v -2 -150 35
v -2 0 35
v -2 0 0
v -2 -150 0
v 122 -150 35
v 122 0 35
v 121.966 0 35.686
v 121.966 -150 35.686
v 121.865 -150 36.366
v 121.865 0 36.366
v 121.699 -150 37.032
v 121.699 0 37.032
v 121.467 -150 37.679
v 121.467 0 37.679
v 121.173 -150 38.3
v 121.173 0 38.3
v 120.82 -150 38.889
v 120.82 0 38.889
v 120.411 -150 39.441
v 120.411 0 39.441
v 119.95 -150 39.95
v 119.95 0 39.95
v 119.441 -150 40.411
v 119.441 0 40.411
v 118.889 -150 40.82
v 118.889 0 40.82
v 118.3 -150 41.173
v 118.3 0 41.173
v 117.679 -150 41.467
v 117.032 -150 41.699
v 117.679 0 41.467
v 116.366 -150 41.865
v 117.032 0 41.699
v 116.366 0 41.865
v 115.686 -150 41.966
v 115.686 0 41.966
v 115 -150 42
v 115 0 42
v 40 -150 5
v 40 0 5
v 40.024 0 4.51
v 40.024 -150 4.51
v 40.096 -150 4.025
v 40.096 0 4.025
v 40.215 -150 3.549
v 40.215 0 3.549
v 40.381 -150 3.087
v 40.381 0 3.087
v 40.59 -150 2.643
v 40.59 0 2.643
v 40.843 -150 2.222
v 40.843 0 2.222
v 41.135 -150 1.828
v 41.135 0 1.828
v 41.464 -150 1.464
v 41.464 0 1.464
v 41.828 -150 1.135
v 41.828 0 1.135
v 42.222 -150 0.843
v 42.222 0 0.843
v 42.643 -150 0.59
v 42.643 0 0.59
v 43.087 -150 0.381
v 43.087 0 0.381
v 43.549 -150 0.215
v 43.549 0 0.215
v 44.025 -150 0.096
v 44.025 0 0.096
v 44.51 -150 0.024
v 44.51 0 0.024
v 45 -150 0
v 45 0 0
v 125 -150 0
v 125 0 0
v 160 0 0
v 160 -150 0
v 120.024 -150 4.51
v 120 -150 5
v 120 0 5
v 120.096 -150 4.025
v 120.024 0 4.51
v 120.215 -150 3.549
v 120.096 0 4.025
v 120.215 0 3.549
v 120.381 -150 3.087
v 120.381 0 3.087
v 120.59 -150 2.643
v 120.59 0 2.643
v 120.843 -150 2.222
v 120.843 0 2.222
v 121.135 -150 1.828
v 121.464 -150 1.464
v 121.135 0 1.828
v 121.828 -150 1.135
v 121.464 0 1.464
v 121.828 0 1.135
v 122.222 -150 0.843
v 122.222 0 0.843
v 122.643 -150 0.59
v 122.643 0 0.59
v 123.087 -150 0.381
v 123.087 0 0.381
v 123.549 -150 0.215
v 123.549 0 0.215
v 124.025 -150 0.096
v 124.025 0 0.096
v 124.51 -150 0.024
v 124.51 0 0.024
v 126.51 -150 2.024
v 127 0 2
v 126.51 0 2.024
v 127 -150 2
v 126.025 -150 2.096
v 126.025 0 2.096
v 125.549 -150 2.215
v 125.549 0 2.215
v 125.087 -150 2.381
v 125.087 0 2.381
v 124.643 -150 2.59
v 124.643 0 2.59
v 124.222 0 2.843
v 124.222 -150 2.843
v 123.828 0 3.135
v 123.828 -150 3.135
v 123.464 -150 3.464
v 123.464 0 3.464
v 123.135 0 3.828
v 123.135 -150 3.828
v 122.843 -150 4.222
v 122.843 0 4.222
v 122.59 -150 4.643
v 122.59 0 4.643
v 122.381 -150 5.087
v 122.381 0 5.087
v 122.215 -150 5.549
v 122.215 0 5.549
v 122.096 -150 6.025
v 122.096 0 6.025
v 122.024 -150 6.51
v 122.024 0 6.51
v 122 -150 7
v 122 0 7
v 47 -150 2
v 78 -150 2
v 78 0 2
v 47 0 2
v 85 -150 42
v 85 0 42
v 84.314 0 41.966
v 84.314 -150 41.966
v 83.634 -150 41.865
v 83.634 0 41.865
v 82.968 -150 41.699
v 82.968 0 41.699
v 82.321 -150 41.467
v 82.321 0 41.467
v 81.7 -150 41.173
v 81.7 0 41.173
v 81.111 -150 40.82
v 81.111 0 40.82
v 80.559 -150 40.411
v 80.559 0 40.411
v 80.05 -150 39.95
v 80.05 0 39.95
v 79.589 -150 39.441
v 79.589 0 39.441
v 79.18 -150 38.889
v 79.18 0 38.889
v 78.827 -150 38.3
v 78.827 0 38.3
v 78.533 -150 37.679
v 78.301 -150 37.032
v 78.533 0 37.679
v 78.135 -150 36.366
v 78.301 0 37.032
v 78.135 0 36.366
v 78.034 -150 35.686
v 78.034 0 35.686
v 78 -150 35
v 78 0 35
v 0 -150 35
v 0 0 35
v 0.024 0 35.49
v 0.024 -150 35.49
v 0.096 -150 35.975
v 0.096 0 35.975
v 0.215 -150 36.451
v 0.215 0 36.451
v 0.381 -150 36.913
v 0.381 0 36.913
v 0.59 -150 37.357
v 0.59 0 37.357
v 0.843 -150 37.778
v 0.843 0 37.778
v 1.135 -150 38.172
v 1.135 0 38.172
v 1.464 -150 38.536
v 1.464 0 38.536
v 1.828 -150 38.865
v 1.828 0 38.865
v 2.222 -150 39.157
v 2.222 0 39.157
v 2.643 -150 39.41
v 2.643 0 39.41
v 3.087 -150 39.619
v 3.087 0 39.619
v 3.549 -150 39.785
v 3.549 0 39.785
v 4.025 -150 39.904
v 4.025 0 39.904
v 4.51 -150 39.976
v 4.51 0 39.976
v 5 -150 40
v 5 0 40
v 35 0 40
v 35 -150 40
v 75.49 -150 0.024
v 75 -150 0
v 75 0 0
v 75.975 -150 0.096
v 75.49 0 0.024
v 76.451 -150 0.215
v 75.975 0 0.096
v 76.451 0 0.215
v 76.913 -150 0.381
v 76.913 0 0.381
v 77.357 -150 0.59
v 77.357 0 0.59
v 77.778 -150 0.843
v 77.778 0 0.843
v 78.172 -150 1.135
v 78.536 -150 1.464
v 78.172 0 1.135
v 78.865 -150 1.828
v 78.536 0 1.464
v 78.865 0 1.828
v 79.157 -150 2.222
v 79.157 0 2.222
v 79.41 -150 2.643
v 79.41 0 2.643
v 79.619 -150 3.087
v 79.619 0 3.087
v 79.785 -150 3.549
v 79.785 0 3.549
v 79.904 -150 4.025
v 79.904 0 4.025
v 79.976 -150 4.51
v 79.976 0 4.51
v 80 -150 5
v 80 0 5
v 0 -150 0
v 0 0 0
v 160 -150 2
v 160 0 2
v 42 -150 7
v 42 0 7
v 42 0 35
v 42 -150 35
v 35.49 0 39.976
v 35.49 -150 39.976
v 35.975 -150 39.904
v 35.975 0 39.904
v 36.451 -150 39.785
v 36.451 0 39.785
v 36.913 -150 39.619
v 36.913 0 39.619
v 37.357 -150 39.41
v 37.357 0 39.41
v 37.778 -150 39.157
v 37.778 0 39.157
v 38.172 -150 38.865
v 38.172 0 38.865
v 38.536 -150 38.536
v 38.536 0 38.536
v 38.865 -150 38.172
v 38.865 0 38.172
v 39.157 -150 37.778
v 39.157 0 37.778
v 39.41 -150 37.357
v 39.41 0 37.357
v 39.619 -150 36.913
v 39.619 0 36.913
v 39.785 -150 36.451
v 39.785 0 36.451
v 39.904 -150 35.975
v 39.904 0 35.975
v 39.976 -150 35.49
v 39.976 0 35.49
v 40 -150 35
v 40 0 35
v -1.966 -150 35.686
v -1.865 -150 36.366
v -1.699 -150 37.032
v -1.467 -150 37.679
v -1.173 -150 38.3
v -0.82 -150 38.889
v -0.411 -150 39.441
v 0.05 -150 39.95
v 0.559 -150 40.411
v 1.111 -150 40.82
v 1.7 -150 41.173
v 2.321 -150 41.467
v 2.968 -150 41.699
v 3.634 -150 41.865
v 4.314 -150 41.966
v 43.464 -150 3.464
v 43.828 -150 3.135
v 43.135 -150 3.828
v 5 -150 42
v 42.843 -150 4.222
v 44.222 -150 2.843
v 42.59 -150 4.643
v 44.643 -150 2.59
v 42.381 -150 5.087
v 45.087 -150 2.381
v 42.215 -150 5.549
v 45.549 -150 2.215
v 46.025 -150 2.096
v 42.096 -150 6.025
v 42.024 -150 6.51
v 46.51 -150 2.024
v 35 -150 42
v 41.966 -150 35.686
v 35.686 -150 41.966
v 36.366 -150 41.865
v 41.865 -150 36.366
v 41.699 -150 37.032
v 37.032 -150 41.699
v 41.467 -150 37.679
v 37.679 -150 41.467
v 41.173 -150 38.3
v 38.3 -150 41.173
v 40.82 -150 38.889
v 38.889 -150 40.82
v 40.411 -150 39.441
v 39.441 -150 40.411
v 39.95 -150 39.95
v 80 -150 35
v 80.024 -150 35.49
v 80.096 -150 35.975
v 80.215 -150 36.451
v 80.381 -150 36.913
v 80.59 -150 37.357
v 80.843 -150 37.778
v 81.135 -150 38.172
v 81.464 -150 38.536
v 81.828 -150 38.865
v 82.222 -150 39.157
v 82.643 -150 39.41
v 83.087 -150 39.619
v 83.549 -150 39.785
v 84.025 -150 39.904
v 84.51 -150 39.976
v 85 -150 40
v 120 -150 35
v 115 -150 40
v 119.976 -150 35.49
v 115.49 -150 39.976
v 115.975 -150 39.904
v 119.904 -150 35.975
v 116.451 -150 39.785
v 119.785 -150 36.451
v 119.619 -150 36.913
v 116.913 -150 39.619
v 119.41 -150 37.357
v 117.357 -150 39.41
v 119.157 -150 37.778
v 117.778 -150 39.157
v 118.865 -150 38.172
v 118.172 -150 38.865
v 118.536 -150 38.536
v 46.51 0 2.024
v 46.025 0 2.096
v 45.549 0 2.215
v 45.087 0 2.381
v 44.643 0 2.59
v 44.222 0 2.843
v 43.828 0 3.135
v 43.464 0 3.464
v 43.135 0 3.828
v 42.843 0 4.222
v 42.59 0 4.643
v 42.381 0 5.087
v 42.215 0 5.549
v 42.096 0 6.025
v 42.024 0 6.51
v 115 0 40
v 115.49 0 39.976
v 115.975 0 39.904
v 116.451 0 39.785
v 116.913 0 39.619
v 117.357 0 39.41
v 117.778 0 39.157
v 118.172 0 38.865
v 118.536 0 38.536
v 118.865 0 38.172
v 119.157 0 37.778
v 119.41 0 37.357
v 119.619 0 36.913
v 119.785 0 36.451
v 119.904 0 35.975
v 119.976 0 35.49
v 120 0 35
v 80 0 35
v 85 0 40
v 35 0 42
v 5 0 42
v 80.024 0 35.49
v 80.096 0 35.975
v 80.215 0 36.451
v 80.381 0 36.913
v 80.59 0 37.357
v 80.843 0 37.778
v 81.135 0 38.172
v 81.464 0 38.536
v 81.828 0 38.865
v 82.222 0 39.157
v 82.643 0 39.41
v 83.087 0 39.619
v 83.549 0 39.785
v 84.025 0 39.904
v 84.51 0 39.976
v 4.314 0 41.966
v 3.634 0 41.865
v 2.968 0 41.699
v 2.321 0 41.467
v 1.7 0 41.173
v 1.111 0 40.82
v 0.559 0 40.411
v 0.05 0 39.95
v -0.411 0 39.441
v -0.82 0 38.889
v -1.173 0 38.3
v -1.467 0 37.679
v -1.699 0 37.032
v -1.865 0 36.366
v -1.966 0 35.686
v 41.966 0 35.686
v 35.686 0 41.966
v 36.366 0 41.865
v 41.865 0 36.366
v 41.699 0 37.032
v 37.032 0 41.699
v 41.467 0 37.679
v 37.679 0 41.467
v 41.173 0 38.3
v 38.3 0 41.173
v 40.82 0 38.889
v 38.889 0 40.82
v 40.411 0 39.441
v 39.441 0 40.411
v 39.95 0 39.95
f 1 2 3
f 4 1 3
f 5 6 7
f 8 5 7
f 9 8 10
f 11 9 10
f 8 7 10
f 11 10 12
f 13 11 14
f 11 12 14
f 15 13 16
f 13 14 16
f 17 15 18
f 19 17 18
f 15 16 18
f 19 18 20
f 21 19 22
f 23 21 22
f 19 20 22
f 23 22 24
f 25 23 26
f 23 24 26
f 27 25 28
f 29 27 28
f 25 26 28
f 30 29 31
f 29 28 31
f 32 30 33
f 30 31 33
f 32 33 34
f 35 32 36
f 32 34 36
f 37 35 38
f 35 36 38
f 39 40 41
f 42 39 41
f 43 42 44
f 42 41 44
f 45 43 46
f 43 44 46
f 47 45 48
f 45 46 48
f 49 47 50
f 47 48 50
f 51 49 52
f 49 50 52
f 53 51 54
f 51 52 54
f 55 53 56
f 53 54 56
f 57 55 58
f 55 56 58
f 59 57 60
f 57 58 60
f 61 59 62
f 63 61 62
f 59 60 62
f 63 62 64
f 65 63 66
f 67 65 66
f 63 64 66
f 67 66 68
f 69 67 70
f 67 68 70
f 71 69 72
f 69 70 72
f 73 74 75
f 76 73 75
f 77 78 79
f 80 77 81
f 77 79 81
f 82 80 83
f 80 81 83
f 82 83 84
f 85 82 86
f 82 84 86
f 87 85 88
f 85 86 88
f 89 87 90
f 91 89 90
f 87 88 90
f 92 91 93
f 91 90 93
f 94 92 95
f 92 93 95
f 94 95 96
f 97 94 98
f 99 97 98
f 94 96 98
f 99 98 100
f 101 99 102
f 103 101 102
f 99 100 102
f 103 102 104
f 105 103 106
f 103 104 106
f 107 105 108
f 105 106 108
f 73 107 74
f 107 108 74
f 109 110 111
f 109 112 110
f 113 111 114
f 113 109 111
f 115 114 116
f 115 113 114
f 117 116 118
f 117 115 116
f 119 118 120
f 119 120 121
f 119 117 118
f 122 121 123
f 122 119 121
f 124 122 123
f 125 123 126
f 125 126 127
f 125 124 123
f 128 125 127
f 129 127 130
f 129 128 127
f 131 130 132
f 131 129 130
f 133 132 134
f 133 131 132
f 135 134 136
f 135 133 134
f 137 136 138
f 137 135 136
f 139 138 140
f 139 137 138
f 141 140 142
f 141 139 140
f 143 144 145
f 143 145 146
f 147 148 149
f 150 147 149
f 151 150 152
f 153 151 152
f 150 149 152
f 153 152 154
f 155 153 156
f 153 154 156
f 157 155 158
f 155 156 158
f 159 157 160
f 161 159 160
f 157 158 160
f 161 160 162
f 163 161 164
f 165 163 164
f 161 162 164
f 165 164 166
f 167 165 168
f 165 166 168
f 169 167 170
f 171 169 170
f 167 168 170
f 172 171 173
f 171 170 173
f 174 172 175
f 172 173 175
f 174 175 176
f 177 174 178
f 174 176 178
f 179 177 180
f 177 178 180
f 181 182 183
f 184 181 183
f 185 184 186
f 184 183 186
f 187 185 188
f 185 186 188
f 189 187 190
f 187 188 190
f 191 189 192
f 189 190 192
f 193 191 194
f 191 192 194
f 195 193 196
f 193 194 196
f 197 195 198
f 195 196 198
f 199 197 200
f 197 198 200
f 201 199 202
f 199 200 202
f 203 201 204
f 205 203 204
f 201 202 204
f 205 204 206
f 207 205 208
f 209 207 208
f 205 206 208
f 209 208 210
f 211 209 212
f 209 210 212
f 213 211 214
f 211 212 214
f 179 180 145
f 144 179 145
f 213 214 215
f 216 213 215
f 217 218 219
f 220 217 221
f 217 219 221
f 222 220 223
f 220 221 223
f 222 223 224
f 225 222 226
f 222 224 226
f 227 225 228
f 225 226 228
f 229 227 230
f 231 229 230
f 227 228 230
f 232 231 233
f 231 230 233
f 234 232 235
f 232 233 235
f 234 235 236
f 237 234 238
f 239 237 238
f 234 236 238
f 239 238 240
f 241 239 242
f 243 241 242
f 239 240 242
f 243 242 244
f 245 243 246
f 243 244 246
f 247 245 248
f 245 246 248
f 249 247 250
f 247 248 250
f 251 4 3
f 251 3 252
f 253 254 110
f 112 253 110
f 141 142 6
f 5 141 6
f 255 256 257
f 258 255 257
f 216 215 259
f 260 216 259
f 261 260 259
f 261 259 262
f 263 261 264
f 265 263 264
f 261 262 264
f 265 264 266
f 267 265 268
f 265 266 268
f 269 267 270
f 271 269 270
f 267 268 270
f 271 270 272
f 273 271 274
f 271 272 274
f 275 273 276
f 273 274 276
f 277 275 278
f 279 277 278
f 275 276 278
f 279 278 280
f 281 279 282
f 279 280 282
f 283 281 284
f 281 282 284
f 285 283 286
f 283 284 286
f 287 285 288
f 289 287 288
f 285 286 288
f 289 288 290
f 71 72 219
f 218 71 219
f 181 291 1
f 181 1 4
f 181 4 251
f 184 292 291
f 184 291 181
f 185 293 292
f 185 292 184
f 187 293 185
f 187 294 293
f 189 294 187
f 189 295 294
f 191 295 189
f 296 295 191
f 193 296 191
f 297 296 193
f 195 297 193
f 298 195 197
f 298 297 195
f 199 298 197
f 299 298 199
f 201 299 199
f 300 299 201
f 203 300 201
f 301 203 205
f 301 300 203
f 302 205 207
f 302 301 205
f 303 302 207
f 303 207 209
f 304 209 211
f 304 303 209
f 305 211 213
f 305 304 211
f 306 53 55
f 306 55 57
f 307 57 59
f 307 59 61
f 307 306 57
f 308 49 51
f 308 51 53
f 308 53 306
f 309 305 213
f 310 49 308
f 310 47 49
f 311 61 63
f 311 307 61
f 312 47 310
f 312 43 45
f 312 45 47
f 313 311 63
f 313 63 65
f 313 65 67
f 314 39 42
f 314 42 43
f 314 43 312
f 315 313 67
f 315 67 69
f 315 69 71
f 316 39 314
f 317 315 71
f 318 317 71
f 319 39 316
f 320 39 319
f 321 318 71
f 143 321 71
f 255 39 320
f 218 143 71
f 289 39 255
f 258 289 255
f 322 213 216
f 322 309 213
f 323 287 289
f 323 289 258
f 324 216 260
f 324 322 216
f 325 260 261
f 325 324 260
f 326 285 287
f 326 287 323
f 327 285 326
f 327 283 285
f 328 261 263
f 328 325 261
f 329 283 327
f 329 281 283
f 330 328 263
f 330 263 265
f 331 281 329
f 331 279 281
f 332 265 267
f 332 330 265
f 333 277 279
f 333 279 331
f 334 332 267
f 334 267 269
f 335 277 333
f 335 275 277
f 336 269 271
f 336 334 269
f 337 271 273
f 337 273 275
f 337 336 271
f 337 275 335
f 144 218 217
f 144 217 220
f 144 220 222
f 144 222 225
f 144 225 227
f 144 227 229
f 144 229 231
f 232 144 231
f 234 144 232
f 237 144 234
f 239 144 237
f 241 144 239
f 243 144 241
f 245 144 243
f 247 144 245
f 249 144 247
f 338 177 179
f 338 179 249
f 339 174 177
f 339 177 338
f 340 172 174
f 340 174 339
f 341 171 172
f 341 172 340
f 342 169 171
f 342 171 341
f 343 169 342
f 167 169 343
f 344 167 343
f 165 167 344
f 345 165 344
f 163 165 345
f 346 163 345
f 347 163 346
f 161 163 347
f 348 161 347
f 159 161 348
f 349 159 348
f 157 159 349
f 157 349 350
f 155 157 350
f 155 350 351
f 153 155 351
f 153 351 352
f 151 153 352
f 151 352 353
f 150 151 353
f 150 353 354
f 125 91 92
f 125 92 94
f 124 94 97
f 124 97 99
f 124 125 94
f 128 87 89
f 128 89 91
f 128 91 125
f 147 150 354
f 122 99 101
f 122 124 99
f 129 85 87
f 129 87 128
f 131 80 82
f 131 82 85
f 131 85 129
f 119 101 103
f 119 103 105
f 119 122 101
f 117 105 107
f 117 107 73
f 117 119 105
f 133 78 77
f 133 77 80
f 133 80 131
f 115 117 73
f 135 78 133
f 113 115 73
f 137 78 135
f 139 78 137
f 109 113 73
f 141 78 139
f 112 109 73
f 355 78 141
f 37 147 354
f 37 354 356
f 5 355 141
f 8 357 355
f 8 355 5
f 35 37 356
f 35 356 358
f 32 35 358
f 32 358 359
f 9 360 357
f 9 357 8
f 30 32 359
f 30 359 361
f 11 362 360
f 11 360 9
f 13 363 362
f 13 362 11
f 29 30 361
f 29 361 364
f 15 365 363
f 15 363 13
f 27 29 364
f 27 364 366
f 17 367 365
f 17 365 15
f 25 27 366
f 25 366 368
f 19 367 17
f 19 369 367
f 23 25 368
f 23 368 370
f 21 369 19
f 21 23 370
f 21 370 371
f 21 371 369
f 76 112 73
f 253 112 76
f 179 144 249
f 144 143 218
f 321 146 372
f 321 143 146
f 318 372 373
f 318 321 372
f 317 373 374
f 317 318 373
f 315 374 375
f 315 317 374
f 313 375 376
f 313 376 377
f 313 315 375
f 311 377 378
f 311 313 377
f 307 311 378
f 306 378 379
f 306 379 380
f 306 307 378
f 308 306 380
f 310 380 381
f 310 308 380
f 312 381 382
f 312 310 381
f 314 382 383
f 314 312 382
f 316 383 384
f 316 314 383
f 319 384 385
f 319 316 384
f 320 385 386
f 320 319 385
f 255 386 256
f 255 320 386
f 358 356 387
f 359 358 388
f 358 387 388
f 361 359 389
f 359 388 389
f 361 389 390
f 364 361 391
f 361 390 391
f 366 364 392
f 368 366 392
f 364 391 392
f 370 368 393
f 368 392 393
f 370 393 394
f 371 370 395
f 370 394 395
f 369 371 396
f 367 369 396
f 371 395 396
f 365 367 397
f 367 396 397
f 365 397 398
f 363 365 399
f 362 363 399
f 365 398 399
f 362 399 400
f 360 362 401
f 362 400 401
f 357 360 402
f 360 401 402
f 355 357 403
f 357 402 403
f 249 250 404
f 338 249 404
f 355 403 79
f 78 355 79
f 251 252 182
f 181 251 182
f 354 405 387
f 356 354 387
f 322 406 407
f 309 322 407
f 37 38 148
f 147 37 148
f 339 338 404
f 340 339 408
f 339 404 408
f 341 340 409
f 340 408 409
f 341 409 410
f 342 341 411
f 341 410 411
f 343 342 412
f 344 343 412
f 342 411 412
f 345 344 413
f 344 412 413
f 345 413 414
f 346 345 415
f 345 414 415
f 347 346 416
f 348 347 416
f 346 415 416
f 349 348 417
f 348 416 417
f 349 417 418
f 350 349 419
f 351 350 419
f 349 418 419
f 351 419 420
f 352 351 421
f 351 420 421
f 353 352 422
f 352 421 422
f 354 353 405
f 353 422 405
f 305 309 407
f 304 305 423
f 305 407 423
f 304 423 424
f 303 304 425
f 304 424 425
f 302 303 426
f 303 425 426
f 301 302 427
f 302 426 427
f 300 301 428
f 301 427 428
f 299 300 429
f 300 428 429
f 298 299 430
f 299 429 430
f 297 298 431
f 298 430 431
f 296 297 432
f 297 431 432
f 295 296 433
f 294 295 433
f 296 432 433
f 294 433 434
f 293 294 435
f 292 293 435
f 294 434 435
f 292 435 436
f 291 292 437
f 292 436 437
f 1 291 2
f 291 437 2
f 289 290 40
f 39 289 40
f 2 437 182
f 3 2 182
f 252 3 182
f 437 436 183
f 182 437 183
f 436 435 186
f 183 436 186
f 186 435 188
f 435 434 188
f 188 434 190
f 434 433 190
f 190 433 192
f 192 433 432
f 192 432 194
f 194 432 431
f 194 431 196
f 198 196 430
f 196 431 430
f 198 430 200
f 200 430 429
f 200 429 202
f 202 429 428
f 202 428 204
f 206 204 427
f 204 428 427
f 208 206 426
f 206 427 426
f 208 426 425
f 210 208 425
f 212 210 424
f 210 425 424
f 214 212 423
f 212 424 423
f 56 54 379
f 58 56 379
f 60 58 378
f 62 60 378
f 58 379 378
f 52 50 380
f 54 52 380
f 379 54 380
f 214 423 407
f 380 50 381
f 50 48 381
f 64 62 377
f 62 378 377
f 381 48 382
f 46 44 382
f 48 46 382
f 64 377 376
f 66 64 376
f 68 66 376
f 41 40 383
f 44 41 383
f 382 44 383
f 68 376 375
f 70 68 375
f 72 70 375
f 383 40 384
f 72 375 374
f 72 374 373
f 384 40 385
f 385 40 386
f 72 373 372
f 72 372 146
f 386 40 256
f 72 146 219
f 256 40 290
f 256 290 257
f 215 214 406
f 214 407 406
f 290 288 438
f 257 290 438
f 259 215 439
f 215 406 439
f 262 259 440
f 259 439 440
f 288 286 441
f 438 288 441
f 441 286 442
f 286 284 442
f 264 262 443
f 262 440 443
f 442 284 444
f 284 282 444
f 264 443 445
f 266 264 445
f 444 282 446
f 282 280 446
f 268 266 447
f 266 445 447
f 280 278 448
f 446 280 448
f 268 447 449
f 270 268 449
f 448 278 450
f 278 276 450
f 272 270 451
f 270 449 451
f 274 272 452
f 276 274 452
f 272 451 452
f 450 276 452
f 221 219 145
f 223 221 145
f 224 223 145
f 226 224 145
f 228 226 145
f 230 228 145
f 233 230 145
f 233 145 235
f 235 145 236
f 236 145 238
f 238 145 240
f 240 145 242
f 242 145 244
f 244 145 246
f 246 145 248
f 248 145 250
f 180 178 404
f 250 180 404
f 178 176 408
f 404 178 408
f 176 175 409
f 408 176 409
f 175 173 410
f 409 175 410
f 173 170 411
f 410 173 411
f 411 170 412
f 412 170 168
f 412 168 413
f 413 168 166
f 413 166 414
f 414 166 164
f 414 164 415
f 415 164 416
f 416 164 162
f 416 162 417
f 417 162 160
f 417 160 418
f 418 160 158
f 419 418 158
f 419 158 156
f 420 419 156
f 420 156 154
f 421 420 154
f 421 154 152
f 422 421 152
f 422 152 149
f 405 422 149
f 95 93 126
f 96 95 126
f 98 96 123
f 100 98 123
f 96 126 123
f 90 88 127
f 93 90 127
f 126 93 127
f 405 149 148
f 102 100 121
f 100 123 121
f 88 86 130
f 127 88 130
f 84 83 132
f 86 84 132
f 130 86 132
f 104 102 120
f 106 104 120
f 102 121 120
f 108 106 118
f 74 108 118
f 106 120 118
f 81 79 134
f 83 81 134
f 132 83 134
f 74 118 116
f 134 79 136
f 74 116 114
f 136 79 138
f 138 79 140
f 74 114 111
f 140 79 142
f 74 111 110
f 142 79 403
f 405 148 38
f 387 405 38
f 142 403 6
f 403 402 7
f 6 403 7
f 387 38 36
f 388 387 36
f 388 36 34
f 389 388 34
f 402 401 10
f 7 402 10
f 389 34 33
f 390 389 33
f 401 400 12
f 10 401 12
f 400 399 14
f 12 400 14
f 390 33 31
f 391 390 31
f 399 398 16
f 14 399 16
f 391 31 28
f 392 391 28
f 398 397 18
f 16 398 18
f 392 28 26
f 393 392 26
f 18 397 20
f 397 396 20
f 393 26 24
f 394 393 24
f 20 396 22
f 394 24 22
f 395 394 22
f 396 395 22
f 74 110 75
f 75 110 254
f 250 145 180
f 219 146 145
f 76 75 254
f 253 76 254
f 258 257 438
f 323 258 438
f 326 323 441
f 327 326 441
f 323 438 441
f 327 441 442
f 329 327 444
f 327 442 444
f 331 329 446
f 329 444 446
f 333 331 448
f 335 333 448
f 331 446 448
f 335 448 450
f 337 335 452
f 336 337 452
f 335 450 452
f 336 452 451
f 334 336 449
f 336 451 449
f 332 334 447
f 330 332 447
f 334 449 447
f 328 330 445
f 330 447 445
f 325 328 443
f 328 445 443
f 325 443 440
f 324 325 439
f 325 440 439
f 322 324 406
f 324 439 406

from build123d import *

# Parameters (mm, degrees)
F1_DEPTH = 150
F2_R     = 5


with BuildPart() as f1:
    # F0 (on Front) → F1 (new body)
    with BuildSketch(Plane.XZ):
        with BuildLine():
            ThreePointArc((0, 35), (1.464466, 38.535534), (5, 40))
            Line((5, 40), (35, 40))
            ThreePointArc((35, 40), (38.535534, 38.535534), (40, 35))
            Line((40, 35), (40, 5))
            ThreePointArc((40, 5), (41.464466, 1.464466), (45, 0))
            Line((45, 0), (75, 0))
            ThreePointArc((75, 0), (78.535534, 1.464466), (80, 5))
            Line((80, 5), (80, 35))
            ThreePointArc((80, 35), (81.464466, 38.535534), (85, 40))
            Line((85, 40), (115, 40))
            ThreePointArc((115, 40), (118.535534, 38.535534), (120, 35))
            Line((120, 35), (120, 5))
            ThreePointArc((120, 5), (121.464466, 1.464466), (125, 0))
            Line((125, 0), (160, 0))
            Line((160, 0), (160, 2))
            Line((160, 2), (122, 2))
            Line((122, 2), (122, 35))
            ThreePointArc((122, 35), (119.949747, 39.949747), (115, 42))
            Line((115, 42), (85, 42))
            ThreePointArc((85, 42), (80.050253, 39.949747), (78, 35))
            Line((78, 35), (78, 2))
            Line((78, 2), (42, 2))
            Line((42, 2), (42, 35))
            ThreePointArc((42, 35), (39.949747, 39.949747), (35, 42))
            Line((35, 42), (5, 42))
            ThreePointArc((5, 42), (0.050253, 39.949747), (-2, 35))
            Line((-2, 35), (-2, 0))
            Line((-2, 0), (0, 0))
            Line((0, 0), (0, 35))
        make_face()
    extrude(amount=F1_DEPTH)

    # F2
    f2_edges = [f1.edges().sort_by_distance(p)[0] for p in [
        (42, -75, 2),
        (122, -75, 2),
    ]]
    fillet(f2_edges, radius=F2_R)


solid = f1.part
